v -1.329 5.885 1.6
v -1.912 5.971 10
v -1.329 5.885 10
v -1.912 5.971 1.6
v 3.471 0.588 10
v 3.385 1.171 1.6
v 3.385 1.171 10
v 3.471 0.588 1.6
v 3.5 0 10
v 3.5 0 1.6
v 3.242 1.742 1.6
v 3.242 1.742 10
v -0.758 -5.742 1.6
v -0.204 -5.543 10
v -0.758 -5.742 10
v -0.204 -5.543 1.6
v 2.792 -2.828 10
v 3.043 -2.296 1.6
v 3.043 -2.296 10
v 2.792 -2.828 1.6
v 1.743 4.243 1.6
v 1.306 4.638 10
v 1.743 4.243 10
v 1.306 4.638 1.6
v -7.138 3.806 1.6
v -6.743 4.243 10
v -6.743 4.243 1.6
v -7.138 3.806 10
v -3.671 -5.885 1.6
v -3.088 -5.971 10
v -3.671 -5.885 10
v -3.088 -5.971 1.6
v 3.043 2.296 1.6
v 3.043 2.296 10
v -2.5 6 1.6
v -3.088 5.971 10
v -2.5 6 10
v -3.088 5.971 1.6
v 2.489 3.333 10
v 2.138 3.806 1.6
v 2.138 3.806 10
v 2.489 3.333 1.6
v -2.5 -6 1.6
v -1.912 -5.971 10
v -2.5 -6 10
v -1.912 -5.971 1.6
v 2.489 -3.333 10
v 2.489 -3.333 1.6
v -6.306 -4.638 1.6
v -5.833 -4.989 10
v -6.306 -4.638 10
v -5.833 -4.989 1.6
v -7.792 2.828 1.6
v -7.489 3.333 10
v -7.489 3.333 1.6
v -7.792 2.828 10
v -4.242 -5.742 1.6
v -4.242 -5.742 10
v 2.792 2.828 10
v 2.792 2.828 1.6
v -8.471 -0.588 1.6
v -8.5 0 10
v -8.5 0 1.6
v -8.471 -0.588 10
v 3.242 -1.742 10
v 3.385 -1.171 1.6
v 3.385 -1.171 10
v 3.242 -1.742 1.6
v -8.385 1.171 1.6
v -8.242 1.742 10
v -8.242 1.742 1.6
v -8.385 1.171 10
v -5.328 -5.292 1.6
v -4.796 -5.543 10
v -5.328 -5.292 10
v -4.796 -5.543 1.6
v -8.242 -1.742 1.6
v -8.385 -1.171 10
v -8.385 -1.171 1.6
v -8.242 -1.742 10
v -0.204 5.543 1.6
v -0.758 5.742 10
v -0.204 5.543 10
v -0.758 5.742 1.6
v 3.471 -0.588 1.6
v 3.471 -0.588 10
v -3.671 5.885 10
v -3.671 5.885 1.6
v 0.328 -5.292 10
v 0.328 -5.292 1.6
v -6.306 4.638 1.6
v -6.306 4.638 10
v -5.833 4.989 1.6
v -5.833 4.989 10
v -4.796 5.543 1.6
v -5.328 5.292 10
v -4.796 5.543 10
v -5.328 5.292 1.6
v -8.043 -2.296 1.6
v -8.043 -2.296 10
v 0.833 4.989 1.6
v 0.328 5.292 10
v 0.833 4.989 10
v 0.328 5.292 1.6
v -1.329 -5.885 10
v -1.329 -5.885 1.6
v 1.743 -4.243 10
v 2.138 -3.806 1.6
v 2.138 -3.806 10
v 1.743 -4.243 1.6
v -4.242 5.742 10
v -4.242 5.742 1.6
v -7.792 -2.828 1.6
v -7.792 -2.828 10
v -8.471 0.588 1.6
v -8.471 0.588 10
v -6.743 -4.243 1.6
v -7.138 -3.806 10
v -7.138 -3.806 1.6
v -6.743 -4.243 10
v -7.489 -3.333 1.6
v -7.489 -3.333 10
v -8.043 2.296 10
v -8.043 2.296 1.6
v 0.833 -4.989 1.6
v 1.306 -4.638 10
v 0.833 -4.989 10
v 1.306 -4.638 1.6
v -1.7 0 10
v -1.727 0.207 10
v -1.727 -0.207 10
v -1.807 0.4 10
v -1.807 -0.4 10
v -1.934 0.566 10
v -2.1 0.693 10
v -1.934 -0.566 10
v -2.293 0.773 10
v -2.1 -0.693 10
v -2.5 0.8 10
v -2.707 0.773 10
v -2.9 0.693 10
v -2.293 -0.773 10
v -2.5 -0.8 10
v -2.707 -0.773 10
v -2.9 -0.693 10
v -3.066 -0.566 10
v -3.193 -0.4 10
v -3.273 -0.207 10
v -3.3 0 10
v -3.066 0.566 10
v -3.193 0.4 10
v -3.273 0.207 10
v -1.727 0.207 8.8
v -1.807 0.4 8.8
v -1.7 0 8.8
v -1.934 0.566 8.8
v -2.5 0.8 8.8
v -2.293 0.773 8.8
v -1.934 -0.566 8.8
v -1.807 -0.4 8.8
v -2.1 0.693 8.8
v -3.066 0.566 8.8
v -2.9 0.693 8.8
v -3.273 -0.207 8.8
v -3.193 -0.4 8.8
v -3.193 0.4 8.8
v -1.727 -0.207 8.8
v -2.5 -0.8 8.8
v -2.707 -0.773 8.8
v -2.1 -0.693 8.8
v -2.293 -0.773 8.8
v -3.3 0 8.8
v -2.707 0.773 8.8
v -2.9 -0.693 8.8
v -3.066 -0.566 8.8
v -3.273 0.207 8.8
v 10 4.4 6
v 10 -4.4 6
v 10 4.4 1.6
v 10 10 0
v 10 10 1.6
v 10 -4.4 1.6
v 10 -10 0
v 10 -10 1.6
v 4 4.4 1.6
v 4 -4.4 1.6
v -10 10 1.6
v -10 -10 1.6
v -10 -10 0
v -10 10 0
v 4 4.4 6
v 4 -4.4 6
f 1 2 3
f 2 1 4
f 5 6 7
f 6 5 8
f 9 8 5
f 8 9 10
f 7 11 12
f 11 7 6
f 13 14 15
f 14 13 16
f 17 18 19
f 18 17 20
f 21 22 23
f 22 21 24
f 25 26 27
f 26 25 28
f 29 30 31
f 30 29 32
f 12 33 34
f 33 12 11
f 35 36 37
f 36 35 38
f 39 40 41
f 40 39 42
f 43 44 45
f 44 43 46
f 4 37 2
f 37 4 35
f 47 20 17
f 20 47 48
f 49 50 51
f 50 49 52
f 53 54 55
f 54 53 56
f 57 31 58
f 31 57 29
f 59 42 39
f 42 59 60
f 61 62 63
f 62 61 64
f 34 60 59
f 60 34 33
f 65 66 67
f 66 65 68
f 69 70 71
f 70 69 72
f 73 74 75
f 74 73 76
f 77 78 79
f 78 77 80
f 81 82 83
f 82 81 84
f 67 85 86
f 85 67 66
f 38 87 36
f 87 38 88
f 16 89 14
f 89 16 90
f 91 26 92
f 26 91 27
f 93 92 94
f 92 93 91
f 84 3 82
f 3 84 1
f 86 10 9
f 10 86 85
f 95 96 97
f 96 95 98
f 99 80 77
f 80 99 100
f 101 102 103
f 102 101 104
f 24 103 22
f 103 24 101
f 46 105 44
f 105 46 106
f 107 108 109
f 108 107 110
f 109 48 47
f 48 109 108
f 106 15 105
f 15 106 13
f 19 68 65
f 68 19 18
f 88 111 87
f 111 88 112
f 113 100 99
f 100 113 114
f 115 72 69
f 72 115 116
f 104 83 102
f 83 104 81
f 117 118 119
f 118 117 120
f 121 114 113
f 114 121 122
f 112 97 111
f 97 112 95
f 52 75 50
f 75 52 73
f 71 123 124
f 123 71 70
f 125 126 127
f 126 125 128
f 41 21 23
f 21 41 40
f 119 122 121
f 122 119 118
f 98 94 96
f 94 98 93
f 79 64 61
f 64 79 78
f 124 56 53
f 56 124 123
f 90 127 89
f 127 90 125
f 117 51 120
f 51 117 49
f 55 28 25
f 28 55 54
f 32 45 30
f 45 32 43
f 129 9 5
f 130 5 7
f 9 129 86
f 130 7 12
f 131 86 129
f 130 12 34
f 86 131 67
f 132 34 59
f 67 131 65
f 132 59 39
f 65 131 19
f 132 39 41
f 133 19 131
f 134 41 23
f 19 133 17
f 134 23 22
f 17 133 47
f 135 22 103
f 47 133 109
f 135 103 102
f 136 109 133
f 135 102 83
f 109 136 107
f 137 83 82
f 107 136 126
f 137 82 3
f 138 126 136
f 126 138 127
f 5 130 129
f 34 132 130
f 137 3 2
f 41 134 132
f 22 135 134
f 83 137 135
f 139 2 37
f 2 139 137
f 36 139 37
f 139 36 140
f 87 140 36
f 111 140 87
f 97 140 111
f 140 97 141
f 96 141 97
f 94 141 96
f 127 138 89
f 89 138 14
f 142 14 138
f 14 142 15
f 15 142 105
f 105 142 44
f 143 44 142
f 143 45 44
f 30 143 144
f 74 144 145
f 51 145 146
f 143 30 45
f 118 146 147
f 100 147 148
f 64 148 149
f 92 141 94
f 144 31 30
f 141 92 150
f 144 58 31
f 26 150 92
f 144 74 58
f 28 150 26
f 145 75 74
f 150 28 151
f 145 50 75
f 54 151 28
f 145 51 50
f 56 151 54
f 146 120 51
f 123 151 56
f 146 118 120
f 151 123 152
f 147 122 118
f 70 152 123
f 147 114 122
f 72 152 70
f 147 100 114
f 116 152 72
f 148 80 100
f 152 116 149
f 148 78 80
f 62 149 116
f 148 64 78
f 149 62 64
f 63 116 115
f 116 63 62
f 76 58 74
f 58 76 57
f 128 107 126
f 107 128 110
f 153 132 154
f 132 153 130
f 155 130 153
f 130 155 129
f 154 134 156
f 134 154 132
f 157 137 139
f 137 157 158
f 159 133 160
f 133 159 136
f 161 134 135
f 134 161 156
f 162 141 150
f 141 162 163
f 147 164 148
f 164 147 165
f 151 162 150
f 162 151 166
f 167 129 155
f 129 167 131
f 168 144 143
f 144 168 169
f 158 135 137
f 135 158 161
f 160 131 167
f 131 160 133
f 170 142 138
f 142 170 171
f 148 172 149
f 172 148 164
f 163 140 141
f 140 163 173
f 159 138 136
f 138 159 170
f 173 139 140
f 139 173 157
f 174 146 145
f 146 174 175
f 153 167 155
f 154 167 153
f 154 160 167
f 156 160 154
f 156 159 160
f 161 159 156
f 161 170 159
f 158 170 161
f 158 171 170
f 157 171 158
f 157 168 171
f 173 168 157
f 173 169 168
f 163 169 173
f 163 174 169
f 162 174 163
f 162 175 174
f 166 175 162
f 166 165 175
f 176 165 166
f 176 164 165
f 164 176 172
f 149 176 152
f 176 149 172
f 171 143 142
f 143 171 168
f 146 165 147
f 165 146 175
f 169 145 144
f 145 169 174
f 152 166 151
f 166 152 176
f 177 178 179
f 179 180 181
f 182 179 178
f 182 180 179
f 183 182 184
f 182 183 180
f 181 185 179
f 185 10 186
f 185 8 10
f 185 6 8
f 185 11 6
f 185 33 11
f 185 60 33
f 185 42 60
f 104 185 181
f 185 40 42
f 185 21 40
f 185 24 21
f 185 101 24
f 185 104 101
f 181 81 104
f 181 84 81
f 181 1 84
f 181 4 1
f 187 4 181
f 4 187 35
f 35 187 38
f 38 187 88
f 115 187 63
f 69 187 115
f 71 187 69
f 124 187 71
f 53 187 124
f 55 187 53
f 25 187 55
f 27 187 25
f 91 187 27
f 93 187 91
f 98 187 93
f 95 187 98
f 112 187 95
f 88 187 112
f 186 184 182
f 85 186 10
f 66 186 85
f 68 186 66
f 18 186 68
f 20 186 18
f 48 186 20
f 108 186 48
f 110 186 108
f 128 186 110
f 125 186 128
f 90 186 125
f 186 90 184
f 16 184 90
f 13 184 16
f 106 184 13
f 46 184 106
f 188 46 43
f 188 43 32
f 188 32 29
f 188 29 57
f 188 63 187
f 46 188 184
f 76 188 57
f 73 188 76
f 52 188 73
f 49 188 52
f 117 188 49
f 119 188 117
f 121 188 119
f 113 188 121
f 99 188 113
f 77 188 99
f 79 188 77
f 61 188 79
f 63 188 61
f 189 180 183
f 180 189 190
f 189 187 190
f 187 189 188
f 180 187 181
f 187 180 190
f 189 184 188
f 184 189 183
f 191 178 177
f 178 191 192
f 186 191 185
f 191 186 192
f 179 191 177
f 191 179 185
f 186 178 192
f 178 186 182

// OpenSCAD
/*
  Seeed Grove - Passive Buzzer (SKU 107020109)  -  fit-check mock-up
  ---------------------------------------------------------------------------
  3-5 V, ~2700 Hz, > 80 dB, Grove 4-pin port.

  What is VERIFIED (Seeed wiki + retailer spec sheets: Botland, Gotronic,
  Switch Science, all agree):
      module envelope ........ 20 x 20 x 10 mm   (board + buzzer)
  What is ESTIMATED (no mechanical drawing published by Seeed - measure it
  with a caliper before relying on it):
      PCB thickness .......... 1.6 mm
      piezo can .............. d12 mm, centred on the Y axis, shifted to -X
      Grove connector ........ 4-pin 2.0 mm pitch socket, 6 x 8.8 x 4.4 mm,
                               flush with the +X edge of the board

  The module is glued (no screws), so mounting holes are not modelled.

  Local frame: origin = centre of the board's BOTTOM (glued) face,
               +Z = up through the board and the buzzer,  Z in [0, bz_h].
  ---------------------------------------------------------------------------
*/

bz_w       = 20;     // board size X  (verified)
bz_l       = 20;     // board size Y  (verified)
bz_h       = 10;     // total height, board bottom -> top of the buzzer (verified)
bz_pcb_t   = 1.6;    // PCB thickness (estimate)
bz_can_d   = 12;     // piezo can diameter (estimate)
bz_can_x   = -2.5;   // can centre along X (estimate)
bz_hole_d  = 1.6;    // sound hole on top of the can (estimate)
bz_conn    = [6, 8.8, 4.4];   // Grove socket X, Y, Z above the PCB (estimate)

module grove_passive_buzzer() {
    // PCB
    color("#f2f4f7")
        translate([-bz_w/2, -bz_l/2, 0]) cube([bz_w, bz_l, bz_pcb_t]);
    // piezo can: cylinder up to the full 10 mm height, with a small sound hole
    color("#15171c")
        difference() {
            translate([bz_can_x, 0, bz_pcb_t - 0.01])
                cylinder(d = bz_can_d, h = bz_h - bz_pcb_t + 0.01, $fn = 64);
            translate([bz_can_x, 0, bz_h - 1.2])
                cylinder(d = bz_hole_d, h = 2, $fn = 24);
        }
    // Grove 4-pin socket on the +X edge
    color("#e9e6dc")
        translate([bz_w/2 - bz_conn[0], -bz_conn[1]/2, bz_pcb_t - 0.01])
            cube([bz_conn[0], bz_conn[1], bz_conn[2] + 0.01]);
}

// stand-alone preview / export
grove_passive_buzzer();
